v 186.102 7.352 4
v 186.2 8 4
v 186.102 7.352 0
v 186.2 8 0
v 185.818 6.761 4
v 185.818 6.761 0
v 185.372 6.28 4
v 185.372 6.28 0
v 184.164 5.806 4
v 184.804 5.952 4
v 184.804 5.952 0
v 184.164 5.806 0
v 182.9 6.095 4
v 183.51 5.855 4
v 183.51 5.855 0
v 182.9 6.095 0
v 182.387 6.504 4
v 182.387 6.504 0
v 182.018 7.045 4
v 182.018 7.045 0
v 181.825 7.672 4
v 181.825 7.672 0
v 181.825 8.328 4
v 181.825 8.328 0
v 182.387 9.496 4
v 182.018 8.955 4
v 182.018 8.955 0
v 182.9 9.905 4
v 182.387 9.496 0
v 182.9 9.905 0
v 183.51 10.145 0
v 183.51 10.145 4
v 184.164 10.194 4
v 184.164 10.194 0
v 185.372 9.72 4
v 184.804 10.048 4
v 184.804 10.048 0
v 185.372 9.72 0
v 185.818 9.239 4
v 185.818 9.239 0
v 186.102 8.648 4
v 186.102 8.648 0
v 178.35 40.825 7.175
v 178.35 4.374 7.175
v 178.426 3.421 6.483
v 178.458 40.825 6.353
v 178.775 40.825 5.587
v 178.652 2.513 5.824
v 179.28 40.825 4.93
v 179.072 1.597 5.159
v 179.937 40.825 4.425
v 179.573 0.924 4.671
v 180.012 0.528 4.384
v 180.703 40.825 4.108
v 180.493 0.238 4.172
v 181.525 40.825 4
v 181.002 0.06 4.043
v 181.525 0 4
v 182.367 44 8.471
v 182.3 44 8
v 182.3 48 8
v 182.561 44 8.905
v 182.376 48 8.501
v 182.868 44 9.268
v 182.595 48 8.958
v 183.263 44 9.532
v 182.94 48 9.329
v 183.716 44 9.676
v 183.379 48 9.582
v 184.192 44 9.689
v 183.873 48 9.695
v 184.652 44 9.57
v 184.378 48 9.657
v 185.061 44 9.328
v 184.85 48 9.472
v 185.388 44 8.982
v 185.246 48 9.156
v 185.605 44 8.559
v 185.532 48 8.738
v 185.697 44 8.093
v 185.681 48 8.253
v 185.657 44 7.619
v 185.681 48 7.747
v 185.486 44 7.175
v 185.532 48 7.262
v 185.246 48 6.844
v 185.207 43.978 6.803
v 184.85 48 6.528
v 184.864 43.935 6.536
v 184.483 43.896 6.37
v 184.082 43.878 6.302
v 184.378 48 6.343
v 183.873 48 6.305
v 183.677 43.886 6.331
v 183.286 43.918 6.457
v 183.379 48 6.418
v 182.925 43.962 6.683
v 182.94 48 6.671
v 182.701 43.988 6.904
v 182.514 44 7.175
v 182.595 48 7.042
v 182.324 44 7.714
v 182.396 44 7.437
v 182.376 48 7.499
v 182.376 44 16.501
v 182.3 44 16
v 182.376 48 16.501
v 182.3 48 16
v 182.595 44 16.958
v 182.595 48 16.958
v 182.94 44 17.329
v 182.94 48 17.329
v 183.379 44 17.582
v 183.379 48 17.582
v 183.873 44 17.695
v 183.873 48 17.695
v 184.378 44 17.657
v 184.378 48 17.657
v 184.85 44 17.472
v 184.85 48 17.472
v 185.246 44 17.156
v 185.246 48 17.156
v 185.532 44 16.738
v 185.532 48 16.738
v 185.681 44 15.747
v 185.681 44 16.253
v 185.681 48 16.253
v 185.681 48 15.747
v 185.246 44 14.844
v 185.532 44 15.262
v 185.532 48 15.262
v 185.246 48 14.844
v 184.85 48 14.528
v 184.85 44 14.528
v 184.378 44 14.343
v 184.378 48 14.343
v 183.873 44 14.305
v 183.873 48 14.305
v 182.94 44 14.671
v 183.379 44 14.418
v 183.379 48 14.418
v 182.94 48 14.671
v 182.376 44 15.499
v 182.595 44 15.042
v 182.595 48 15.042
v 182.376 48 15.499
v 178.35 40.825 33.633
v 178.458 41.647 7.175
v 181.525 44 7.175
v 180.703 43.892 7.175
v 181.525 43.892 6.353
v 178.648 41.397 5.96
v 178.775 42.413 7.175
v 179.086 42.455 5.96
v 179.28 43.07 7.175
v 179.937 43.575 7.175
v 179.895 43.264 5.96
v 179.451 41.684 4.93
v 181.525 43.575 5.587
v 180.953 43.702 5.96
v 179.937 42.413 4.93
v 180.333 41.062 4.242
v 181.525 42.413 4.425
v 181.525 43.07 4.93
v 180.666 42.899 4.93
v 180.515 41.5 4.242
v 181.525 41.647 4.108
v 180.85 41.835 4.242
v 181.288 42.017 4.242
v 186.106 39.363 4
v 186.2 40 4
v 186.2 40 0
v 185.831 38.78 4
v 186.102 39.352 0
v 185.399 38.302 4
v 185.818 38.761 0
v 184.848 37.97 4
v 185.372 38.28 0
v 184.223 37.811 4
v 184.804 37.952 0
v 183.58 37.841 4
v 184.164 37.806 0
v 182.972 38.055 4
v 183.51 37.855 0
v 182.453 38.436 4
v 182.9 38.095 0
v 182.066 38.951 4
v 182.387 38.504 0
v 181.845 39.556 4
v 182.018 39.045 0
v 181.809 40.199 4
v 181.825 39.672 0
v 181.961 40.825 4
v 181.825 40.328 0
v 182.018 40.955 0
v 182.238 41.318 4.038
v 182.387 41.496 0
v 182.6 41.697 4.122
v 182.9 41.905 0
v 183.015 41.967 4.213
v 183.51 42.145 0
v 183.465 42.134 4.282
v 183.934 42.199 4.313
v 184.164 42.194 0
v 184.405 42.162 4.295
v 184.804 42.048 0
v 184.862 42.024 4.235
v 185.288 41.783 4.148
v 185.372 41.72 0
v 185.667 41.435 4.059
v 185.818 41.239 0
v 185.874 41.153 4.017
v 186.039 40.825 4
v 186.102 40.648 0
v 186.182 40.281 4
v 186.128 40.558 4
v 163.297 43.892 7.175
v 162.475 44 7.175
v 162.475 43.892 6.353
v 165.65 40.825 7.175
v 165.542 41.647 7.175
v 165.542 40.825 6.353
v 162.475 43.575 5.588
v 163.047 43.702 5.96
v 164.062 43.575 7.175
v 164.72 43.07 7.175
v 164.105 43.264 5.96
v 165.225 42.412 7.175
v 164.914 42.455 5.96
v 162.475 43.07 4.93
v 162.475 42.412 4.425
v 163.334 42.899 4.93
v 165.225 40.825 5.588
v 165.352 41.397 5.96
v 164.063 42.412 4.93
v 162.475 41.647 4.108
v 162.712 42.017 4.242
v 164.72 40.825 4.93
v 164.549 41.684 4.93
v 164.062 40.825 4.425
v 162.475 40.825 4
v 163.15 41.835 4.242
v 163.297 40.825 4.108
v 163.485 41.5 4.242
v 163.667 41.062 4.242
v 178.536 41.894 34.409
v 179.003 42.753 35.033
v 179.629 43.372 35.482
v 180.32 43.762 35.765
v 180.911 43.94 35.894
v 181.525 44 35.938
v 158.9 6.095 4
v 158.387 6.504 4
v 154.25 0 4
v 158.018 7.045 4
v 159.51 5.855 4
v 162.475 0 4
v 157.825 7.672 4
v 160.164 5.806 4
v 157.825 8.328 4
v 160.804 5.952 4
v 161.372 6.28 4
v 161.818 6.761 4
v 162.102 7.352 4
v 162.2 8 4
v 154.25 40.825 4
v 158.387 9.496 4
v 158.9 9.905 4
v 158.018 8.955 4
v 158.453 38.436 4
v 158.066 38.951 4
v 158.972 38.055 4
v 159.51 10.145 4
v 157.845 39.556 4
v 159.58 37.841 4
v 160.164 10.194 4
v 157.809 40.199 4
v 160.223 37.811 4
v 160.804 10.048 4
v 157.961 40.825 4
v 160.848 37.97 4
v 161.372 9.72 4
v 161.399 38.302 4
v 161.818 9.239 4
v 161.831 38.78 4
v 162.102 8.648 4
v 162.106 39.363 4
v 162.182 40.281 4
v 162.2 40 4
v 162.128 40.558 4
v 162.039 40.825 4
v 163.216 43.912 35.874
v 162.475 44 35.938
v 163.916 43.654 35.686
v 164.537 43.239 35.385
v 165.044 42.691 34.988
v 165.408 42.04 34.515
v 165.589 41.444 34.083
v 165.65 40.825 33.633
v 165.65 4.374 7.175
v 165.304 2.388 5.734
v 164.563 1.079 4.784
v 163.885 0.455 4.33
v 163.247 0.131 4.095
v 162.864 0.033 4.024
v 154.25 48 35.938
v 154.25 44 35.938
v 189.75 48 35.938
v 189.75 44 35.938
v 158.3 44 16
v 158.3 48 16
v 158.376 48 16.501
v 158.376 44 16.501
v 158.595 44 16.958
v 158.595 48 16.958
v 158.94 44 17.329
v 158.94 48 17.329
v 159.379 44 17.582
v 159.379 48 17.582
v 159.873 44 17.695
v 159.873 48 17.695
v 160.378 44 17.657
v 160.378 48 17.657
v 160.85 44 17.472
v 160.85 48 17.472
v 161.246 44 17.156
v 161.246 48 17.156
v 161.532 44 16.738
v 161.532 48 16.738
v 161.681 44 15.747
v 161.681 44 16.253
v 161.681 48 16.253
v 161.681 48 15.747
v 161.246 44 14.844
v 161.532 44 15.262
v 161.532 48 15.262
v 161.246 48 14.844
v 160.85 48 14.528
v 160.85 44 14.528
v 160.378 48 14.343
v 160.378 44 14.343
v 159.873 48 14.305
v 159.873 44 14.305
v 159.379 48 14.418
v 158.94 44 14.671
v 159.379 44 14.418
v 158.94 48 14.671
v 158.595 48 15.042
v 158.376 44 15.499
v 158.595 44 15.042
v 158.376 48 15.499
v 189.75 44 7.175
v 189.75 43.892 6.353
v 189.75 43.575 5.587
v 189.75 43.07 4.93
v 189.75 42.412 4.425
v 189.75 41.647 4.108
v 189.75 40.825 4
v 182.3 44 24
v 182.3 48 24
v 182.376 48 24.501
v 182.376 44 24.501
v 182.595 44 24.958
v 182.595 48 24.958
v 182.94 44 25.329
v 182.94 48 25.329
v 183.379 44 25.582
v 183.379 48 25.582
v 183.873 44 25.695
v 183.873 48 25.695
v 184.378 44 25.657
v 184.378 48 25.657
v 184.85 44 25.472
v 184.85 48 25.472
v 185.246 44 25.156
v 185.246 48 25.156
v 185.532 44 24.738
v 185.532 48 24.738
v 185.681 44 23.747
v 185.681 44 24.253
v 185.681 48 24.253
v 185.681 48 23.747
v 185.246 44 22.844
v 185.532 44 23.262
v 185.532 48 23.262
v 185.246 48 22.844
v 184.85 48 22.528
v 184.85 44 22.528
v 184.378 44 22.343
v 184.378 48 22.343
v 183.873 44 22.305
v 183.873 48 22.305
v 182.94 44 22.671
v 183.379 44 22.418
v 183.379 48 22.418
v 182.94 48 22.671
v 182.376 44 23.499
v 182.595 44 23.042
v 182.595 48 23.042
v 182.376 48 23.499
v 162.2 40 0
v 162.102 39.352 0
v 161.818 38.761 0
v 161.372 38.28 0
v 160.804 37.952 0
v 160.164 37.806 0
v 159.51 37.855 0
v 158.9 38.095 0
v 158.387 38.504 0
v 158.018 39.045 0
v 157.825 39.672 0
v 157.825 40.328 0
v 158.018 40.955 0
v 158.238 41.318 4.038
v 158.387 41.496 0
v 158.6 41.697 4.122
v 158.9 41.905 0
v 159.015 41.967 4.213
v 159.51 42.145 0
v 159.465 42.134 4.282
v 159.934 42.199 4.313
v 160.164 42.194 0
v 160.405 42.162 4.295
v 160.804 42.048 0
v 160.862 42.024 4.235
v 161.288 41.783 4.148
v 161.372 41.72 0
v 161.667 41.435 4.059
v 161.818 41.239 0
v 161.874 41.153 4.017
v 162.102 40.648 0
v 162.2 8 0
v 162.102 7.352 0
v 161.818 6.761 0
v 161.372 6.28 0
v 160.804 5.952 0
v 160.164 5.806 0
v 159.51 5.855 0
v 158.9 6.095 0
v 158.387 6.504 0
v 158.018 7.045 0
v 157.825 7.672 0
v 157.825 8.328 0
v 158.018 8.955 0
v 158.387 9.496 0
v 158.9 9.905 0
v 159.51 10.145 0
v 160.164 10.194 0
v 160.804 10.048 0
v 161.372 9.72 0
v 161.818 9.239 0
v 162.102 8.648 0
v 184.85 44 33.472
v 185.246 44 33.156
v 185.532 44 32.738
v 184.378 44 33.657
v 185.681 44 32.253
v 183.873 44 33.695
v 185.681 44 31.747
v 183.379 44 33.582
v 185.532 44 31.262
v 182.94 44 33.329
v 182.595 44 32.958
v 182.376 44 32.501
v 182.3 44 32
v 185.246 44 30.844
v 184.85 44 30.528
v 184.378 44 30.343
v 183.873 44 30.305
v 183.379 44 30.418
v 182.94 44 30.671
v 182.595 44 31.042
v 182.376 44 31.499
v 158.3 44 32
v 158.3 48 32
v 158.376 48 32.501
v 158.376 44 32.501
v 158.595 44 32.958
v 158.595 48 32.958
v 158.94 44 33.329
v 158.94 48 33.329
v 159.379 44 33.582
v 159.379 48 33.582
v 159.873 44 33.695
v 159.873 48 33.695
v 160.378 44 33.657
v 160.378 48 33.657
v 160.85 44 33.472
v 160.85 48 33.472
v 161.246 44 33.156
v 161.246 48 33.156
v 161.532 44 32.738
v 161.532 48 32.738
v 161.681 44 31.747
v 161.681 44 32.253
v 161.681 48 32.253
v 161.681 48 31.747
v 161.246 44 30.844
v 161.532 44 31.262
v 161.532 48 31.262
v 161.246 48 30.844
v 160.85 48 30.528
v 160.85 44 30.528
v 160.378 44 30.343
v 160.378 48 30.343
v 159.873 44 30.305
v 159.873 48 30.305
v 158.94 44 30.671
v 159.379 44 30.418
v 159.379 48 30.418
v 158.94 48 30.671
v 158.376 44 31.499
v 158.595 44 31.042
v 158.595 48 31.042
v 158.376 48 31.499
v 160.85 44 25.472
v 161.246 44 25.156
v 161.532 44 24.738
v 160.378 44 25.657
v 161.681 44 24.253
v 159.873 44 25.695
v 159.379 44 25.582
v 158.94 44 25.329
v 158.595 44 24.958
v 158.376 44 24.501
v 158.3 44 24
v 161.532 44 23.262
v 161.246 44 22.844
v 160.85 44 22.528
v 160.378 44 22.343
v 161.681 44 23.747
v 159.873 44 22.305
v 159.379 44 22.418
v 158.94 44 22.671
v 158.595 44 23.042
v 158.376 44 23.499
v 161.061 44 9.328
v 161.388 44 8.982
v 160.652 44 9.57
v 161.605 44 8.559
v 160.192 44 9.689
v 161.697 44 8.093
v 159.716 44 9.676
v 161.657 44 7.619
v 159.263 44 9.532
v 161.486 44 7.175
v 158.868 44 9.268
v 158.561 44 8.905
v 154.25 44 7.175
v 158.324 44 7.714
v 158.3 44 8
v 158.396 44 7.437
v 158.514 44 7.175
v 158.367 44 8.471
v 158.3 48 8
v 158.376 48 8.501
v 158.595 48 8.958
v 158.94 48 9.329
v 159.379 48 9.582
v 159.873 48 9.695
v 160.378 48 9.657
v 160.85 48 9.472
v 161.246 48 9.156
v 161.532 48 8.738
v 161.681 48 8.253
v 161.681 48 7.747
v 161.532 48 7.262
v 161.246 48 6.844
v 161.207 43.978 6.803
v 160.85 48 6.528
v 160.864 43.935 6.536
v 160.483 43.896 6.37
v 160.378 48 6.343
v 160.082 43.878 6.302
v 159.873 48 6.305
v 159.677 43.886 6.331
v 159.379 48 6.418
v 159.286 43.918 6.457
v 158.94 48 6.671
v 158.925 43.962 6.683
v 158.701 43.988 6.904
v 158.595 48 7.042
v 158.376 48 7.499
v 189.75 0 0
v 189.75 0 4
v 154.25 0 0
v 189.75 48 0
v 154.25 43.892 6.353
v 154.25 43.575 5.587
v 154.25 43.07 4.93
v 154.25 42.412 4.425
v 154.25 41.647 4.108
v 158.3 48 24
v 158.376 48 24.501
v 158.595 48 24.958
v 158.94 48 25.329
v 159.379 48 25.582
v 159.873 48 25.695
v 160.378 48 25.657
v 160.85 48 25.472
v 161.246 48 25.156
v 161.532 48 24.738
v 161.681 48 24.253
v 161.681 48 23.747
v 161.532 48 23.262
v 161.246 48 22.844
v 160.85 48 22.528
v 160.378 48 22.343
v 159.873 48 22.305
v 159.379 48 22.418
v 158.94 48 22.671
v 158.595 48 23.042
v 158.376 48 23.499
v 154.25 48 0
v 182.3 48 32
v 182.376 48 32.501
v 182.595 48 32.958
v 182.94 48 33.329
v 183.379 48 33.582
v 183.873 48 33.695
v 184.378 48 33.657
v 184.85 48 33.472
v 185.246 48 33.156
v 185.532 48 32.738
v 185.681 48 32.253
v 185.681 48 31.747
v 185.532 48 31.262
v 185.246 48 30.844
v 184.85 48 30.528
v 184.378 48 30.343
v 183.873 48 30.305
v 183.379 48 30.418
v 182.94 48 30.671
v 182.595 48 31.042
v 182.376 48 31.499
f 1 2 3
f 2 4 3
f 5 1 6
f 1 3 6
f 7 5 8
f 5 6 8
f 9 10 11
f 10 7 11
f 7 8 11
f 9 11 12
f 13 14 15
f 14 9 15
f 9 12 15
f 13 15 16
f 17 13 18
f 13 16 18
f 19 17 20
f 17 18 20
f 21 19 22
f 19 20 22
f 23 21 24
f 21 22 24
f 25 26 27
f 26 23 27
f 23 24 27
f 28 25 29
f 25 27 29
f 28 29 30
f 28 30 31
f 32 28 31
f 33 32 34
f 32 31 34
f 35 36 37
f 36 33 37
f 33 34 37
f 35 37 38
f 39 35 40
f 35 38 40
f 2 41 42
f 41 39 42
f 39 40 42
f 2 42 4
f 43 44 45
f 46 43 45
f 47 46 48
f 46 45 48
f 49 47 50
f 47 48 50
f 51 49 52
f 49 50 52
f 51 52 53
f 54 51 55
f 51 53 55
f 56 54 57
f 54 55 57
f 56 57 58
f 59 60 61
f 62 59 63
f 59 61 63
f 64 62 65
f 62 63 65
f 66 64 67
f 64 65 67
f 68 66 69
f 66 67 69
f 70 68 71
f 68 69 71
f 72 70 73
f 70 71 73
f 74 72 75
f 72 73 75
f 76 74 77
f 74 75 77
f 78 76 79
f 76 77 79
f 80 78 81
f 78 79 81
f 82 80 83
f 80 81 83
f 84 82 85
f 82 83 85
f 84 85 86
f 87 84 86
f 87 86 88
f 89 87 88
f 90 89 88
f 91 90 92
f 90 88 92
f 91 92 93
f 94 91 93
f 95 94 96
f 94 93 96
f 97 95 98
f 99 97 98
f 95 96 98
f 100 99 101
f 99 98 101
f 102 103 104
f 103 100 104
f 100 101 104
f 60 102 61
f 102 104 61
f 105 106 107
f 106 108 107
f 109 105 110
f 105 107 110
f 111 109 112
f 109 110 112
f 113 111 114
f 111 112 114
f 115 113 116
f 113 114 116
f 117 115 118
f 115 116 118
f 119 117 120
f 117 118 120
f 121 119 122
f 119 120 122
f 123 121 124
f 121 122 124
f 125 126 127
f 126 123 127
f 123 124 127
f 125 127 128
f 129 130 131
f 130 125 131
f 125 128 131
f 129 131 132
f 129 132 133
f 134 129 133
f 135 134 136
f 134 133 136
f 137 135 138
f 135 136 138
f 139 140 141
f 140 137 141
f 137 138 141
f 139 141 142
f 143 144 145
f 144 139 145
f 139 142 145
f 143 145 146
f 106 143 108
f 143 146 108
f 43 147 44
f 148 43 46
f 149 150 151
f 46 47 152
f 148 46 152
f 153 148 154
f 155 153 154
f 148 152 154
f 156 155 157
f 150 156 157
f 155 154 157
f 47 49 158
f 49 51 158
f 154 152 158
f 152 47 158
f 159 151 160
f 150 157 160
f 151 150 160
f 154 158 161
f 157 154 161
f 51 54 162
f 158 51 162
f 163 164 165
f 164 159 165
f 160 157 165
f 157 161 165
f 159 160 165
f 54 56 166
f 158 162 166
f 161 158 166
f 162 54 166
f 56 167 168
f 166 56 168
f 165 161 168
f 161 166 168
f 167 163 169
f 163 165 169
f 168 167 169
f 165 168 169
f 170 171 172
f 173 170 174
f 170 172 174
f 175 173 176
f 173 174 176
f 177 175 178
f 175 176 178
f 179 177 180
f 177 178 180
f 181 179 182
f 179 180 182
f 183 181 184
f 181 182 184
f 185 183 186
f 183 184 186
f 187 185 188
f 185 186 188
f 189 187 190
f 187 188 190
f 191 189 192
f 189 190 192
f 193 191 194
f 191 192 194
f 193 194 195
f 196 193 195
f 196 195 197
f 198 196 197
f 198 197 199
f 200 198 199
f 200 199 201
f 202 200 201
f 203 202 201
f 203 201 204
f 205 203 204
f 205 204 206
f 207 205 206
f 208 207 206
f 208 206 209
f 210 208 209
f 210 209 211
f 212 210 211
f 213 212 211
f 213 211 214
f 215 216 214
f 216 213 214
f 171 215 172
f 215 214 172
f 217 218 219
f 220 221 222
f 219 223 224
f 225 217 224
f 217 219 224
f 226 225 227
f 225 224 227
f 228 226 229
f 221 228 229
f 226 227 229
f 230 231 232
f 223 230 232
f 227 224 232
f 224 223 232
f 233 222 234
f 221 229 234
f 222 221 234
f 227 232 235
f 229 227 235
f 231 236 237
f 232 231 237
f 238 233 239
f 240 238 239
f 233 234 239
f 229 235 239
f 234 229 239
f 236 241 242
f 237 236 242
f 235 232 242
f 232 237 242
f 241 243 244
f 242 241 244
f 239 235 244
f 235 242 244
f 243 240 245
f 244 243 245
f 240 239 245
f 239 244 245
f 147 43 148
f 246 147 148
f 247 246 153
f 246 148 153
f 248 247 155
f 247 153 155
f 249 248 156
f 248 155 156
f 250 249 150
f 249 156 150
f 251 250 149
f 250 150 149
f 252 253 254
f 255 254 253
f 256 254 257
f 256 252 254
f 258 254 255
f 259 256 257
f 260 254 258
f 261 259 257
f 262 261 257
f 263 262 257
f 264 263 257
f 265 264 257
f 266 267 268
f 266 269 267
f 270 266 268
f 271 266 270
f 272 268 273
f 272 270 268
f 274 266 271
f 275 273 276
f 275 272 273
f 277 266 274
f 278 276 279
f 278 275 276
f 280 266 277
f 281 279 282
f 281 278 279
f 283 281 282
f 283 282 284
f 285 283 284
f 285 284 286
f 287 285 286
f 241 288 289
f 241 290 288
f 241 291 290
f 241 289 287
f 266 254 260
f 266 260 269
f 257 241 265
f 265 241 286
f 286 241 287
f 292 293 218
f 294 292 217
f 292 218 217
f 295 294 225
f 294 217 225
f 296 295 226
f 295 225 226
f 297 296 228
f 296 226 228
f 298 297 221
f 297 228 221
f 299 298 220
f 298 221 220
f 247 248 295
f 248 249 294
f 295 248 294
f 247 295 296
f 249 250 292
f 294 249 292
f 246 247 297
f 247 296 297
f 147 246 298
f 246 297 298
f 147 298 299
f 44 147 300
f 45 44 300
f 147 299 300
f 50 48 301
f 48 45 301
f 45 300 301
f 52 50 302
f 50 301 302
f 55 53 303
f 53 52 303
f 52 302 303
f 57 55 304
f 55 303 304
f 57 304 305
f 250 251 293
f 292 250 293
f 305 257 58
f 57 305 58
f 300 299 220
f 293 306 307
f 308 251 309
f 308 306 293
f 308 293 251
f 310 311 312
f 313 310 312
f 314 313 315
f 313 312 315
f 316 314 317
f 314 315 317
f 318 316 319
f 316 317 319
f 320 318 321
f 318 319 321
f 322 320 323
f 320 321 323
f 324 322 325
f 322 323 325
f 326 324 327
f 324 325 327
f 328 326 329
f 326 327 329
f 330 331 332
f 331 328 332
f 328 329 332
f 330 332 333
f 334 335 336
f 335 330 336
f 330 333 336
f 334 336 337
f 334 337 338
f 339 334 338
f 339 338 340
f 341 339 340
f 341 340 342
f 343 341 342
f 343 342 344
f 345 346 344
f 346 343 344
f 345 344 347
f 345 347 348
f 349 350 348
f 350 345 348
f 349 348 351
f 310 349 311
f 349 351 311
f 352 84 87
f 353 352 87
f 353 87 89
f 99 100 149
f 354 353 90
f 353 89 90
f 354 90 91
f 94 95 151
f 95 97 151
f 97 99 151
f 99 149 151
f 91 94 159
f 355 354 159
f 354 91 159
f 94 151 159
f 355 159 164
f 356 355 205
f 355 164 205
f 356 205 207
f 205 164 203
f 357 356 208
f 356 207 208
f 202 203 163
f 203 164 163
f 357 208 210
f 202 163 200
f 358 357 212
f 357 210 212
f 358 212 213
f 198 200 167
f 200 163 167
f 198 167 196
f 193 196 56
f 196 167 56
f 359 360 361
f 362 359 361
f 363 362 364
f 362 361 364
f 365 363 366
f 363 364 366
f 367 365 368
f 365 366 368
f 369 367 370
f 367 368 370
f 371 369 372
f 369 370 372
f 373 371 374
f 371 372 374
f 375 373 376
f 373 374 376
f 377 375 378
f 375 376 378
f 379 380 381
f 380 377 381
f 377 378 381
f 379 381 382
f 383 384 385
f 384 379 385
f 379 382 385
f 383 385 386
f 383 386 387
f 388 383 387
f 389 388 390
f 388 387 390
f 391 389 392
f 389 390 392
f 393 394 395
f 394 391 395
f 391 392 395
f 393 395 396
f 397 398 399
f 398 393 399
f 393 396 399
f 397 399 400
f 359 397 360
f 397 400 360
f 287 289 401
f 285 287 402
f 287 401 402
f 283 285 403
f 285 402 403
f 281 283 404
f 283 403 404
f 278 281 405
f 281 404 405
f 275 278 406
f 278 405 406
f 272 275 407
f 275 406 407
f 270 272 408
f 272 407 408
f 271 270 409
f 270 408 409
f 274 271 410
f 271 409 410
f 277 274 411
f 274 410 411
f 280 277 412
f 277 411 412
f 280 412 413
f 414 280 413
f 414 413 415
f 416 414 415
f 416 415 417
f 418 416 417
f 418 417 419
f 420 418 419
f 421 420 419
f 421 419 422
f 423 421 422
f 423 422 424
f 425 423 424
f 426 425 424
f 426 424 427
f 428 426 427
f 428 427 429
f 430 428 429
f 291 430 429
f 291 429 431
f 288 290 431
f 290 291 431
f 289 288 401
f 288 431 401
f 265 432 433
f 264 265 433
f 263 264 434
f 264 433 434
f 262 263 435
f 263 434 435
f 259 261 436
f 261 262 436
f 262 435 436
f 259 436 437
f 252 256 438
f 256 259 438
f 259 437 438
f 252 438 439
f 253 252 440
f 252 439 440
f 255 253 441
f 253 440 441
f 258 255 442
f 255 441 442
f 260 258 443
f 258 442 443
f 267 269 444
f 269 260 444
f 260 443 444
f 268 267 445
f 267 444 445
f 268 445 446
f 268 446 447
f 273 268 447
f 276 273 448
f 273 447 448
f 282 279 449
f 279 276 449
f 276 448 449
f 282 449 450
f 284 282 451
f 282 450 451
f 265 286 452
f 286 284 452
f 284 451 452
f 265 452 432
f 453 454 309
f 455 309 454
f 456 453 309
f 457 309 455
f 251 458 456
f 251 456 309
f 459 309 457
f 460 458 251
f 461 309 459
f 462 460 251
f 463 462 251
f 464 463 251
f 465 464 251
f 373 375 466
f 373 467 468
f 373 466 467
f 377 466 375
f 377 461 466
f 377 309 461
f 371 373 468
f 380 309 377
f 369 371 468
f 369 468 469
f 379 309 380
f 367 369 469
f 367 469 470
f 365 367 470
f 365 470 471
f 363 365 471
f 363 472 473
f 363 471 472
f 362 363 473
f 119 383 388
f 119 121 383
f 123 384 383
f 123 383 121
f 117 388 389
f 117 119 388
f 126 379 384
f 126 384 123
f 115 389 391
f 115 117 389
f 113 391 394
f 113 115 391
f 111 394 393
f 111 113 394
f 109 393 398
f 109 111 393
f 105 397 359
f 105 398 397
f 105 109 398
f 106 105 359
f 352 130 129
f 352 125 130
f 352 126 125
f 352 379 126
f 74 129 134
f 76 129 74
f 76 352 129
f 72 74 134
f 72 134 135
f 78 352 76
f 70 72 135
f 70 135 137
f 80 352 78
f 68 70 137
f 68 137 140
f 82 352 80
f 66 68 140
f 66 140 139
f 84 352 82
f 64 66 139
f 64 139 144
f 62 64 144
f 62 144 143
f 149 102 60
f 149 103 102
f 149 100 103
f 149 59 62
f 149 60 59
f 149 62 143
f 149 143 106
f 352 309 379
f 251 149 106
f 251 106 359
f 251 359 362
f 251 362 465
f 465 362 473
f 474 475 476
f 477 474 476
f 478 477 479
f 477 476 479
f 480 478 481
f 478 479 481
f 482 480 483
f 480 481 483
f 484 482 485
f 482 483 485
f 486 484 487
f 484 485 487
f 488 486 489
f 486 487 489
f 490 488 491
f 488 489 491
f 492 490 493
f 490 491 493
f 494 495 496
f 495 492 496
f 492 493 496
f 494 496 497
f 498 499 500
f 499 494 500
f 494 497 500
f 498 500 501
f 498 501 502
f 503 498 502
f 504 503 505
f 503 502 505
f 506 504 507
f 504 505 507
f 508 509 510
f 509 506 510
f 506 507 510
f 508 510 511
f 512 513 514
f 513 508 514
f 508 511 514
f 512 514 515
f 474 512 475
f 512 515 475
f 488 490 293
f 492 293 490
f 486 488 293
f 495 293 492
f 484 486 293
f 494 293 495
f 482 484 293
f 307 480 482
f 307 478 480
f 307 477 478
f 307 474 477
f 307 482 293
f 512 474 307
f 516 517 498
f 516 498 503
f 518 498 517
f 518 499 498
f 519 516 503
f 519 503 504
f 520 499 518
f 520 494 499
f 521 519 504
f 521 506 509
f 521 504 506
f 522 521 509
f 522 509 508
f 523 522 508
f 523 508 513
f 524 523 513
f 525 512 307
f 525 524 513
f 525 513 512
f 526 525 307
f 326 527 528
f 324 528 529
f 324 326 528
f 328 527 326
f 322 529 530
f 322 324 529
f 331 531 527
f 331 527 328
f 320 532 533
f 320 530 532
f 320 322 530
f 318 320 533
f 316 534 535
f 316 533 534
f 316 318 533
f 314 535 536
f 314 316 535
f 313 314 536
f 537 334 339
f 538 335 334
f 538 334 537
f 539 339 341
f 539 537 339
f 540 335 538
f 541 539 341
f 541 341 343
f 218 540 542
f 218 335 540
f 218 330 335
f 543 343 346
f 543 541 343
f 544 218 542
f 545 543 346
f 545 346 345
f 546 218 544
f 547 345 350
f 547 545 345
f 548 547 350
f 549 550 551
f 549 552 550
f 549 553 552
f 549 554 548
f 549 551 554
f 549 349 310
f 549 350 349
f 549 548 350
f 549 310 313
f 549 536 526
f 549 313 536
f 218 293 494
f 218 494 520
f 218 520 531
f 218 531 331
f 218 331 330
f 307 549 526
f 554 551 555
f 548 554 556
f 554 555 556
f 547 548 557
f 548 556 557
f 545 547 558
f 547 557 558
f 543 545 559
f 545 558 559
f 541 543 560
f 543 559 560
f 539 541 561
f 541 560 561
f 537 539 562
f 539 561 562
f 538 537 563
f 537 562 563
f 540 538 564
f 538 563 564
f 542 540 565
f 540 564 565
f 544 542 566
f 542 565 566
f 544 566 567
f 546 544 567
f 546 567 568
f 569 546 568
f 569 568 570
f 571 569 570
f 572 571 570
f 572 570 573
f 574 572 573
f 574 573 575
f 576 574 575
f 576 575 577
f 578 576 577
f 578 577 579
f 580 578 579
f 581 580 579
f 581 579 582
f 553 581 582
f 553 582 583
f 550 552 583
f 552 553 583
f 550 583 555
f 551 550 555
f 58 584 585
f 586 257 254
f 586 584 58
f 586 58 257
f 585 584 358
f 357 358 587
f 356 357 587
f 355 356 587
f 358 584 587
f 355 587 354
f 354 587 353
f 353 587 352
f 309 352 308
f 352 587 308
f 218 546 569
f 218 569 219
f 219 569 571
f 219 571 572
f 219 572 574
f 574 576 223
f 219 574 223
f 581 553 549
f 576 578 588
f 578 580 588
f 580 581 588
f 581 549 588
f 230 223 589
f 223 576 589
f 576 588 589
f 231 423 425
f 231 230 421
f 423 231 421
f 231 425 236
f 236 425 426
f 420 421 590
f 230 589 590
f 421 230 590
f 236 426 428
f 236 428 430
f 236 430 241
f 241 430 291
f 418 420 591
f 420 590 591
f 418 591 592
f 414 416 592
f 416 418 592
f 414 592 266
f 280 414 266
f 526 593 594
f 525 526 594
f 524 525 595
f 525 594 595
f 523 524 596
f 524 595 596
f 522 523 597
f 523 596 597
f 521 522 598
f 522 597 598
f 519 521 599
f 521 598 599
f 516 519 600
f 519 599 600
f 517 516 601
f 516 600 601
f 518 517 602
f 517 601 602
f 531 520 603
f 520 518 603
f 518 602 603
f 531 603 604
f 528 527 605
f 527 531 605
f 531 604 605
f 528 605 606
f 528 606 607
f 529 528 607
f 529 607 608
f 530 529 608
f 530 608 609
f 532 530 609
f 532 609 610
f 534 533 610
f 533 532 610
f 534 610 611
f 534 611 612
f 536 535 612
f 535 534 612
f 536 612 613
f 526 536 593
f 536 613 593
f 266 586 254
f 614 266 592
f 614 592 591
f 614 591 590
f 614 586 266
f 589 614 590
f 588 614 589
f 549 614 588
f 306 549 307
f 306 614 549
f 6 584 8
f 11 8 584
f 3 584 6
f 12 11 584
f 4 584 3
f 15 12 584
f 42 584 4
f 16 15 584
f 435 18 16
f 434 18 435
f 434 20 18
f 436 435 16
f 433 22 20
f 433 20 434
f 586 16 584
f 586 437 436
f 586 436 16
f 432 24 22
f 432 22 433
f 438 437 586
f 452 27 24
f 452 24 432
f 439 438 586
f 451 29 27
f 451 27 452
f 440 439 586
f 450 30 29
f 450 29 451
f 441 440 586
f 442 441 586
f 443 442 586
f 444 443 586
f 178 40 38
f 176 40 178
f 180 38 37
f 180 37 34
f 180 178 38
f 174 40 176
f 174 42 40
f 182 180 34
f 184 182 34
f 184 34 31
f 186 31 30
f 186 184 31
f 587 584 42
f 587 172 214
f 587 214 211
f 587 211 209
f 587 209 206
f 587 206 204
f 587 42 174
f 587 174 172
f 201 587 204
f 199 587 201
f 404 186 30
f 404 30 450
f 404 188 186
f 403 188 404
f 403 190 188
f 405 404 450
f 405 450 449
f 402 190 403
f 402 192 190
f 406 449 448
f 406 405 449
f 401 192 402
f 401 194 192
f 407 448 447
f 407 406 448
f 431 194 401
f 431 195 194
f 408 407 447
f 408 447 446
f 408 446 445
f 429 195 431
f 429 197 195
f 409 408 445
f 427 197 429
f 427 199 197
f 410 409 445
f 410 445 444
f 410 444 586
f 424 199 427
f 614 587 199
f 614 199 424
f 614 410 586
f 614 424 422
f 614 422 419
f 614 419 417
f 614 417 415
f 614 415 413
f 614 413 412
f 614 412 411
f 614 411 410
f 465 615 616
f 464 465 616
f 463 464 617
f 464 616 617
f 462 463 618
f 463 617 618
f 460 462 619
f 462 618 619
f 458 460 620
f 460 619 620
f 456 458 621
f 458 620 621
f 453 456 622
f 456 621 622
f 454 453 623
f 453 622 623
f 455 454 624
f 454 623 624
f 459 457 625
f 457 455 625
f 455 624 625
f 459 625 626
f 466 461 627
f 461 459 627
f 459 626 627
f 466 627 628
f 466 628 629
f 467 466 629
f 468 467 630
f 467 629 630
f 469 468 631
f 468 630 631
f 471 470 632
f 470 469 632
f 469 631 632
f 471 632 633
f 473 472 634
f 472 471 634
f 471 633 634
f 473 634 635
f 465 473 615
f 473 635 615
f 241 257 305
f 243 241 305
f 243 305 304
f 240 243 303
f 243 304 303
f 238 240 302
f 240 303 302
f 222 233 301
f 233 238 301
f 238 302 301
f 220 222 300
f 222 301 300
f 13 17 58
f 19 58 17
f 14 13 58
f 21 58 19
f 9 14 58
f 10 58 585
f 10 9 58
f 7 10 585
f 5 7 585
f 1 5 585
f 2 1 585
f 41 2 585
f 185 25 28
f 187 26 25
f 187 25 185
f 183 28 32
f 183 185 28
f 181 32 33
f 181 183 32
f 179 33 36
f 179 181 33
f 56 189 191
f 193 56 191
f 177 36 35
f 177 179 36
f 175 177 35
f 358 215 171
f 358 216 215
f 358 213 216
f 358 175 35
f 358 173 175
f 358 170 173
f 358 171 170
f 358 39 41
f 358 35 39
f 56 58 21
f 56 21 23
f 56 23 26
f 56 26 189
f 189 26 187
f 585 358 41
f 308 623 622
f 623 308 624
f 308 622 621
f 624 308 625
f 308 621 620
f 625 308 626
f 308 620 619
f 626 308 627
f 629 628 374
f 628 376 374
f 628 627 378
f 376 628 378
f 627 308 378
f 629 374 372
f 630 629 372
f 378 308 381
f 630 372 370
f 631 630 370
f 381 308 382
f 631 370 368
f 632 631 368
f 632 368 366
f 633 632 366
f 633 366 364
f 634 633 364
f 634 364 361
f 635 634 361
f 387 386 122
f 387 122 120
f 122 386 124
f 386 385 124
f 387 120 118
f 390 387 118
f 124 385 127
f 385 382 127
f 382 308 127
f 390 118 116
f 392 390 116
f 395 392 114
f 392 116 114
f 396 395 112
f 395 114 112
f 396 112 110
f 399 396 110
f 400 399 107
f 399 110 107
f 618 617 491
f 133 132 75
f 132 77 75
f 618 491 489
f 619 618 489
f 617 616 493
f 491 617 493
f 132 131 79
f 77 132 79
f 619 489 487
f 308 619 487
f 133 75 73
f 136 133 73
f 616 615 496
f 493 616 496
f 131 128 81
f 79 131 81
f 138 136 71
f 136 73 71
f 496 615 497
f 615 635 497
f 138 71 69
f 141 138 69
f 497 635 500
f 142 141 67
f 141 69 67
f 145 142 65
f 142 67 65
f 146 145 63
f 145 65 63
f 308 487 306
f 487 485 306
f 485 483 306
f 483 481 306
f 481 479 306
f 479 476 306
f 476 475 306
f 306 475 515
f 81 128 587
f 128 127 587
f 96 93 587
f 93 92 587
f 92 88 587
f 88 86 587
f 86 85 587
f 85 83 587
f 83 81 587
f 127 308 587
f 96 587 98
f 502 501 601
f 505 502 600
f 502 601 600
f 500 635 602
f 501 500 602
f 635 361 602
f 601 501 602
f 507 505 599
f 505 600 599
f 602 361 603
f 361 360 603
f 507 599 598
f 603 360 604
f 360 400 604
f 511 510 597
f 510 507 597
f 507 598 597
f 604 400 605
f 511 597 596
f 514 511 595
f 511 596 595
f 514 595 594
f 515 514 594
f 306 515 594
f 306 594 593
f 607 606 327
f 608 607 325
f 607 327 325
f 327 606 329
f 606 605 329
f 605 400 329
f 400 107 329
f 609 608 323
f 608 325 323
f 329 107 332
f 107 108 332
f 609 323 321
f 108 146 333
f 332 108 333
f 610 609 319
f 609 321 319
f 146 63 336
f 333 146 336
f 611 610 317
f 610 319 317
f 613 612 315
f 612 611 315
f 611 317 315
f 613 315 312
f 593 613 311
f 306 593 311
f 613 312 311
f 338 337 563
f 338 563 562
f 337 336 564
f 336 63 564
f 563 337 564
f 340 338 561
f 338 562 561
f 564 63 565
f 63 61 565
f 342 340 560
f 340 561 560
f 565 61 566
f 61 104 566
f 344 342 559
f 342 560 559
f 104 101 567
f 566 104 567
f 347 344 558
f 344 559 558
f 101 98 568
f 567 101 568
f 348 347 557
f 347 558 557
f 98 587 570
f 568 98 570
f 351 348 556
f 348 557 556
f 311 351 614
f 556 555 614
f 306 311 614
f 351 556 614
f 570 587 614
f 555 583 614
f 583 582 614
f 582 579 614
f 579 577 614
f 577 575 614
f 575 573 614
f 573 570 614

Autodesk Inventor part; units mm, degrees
ref_plane "Work Plane1" through (172, 48, 15.3) normal (0, -1, 0) x (-1, 0, 0)
sketch "Sketch1" plane through (172, 48, 15.3) normal (0, -1, 0) x (-1, 0, 0)
  circle A0 centre (12, -16.7) radius 1.7 construction
  circle A1 centre (12, -32.7) radius 1.7 construction
  circle A2 centre (-12, 7.3) radius 1.7 construction
  circle A3 centre (-12, 15.3) radius 1.7 construction
  circle A4 centre (-12, 23.3) radius 1.7 construction
  circle A5 centre (-12, -24.7) radius 1.7 construction
  circle A6 centre (12, 23.3) radius 1.7 construction
  circle A7 centre (12, -56.7) radius 1.7 construction
  circle A8 centre (12, -48.7) radius 1.7 construction
  circle A9 centre (12, -40.7) radius 1.7 construction
  circle A10 centre (12, -8.7) radius 1.7 construction
  circle A11 centre (-12, -16.7) radius 1.7 construction
  circle A12 centre (12, -24.7) radius 1.7 construction
  circle A13 centre (-12, -0.7) radius 1.7 construction
  circle A14 centre (-12, -40.7) radius 1.7 construction
  circle A15 centre (-12, -48.7) radius 1.7 construction
  circle A16 centre (-12, -56.7) radius 1.7 construction
  circle A17 centre (-12, -32.7) radius 1.7 construction
  circle A18 centre (12, -80.7) radius 1.7 construction
  circle A19 centre (12, 15.3) radius 1.7 construction
  circle A20 centre (12, 7.3) radius 1.7 construction
  circle A21 centre (12, -0.7) radius 1.7 construction
  circle A22 centre (-12, -8.7) radius 1.7 construction
  circle A23 centre (-12, -80.7) radius 1.7 construction
  line L0 (10.05, 51.5627) -> (14.45, 51.5627) construction
  line L1 (14.45, 51.5627) -> (14.45, 45.5871) construction
  line L2 (14.45, 45.5871) -> (10.05, 45.5871) construction
  line L3 (10.05, 45.5871) -> (10.05, 51.5627) construction
  line L4 (10.05, -66.0122) -> (14.45, -66.0122) construction
  line L5 (14.45, -66.0122) -> (14.45, -71.9878) construction
  line L6 (14.45, -71.9878) -> (10.05, -71.9878) construction
  line L7 (10.05, -71.9878) -> (10.05, -66.0122) construction
  line L8 (-10.05, 75.3622) -> (-14.45, 75.3622) construction
  line L9 (-14.45, 75.3622) -> (-14.45, 81.3378) construction
  line L10 (-14.45, 81.3378) -> (-10.05, 81.3378) construction
  line L11 (-10.05, 81.3378) -> (-10.05, 75.3622) construction
  line L12 (-14.45, 56.302) -> (-10.05, 56.302) construction
  line L13 (-10.05, 56.302) -> (-10.05, 50.3264) construction
  line L14 (-10.05, 50.3264) -> (-14.45, 50.3264) construction
  line L15 (-14.45, 50.3264) -> (-14.45, 56.302) construction
  line L16 (9.5604, 33.925) -> (12.375, 35.55) construction
  line L17 (12.375, 35.55) -> (15.1896, 33.925) construction
  line L18 (15.1896, 33.925) -> (15.1896, 30.675) construction
  line L19 (15.1896, 30.675) -> (12.375, 29.05) construction
  line L20 (12.375, 29.05) -> (9.5604, 30.675) construction
  line L21 (9.5604, 30.675) -> (9.5604, 33.925) construction
  line L22 (2.8106, 33.925) -> (5.6252, 35.55) construction
  line L23 (5.6252, 35.55) -> (8.4398, 33.925) construction
  line L24 (8.4398, 33.925) -> (8.4398, 30.675) construction
  line L25 (8.4398, 30.675) -> (5.6252, 29.05) construction
  line L26 (5.6252, 29.05) -> (2.8106, 30.675) construction
  line L27 (2.8106, 30.675) -> (2.8106, 33.925) construction
  line L28 (3.2502, 68.3) -> (3.2502, 81) construction
  line L29 (3.2502, 81) -> (8.0002, 81) construction
  line L30 (8.0002, 81) -> (8.0002, 68.3) construction
  line L31 (8.0002, 68.3) -> (3.2502, 68.3) construction
  circle A24 centre (12.375, 40.3) radius 1.7 construction
  circle A25 centre (5.6252, 40.3) radius 1.7 construction
  line L32 (10.0002, 81) -> (14.75, 81) construction
  line L33 (14.75, 81) -> (14.75, 68.3) construction
  line L34 (14.75, 68.3) -> (10.0002, 68.3) construction
  line L35 (10.0002, 68.3) -> (10.0002, 81) construction
  line L36 (3.2502, 53.6) -> (3.2502, 66.3) construction
  line L37 (3.2502, 66.3) -> (8.0002, 66.3) construction
  line L38 (8.0002, 66.3) -> (8.0002, 53.6) construction
  line L39 (8.0002, 53.6) -> (3.2502, 53.6) construction
  circle A26 centre (-7.75, 60) radius 1.7 construction
  circle A27 centre (-7.75, -75) radius 1.7 construction
  line L40 (-6.125, 72.8146) -> (-4.5, 70) construction
  line L41 (-4.5, 70) -> (-6.125, 67.1854) construction
  line L42 (-6.125, 67.1854) -> (-9.375, 67.1854) construction
  line L43 (-9.375, 67.1854) -> (-11, 70) construction
  line L44 (-11, 70) -> (-9.375, 72.8146) construction
  line L45 (-9.375, 72.8146) -> (-6.125, 72.8146) construction
  line L46 (-6.125, -62.1854) -> (-4.5, -65) construction
  line L47 (-4.5, -65) -> (-6.125, -67.8146) construction
  line L48 (-6.125, -67.8146) -> (-9.375, -67.8146) construction
  line L49 (-9.375, -67.8146) -> (-11, -65) construction
  line L50 (-11, -65) -> (-9.375, -62.1854) construction
  line L51 (-9.375, -62.1854) -> (-6.125, -62.1854) construction
  line L52 (17.75, 85) -> (-17.75, 85) construction
  line L53 (-17.75, 85) -> (-17.75, -85) construction
  line L54 (-17.75, -85) -> (17.75, -85) construction
  line L55 (17.75, -85) -> (17.75, 85) construction
  line L56 (172, 15.3) -> (-20, 15.3) construction
  line L57 (-17.75, 15.3) -> (17.75, 15.3)
  line L58 (17.75, 15.3) -> (17.75, -20.6375)
  line L59 (17.75, -20.6375) -> (-17.75, -20.6375)
  line L60 (-17.75, 15.3) -> (-17.75, -20.6375)
  circle A28 centre (-12, 7.3) radius 1.7
  circle A29 centre (-12, -0.7) radius 1.7
  circle A30 centre (-12, -8.7) radius 1.7
  circle A31 centre (-12, -16.7) radius 1.7
  circle A32 centre (12, -16.7) radius 1.7
  circle A33 centre (12, -8.7) radius 1.7
  circle A34 centre (12, -0.7) radius 1.7
  circle A35 centre (12, 7.3) radius 1.7
extrude "Extrusion1" add sketch "Sketch1" along normal blind 4
ref_plane "Work Plane2" through (0, 0, 0) normal (0, 0, 1) x (1, 0, 0)
sketch "Sketch2" plane through (0, 0, 0) normal (0, 0, 1) x (1, 0, 0)
  line L0 (192, 0) -> (192, 48) construction
  line L1 (0, 48) -> (192, 48) construction
  line L2 (0, 0) -> (0, 48) construction
  line L3 (0, 0) -> (192, 0) construction
  circle A0 centre (168, 24) radius 7 construction
  circle A1 centre (144, 24) radius 7 construction
  arc A2 (160.9289, 33.8995) -> (158.1005, 31.0711) centre (159.5147, 32.4853) ccw construction
  line L4 (161.4142, 33.4142) -> (160.9289, 33.8995) construction
  arc A3 (158.5858, 30.5858) -> (161.4142, 33.4142) centre (160, 32) ccw construction
  line L5 (158.1005, 31.0711) -> (158.5858, 30.5858) construction
  line L6 (156.6863, 26) -> (155.3137, 26) construction
  arc A4 (156.6863, 22) -> (156.6863, 26) centre (156.6863, 24) ccw construction
  line L7 (155.3137, 22) -> (156.6863, 22) construction
  arc A5 (155.3137, 26) -> (155.3137, 22) centre (155.3137, 24) ccw construction
  arc A6 (158.1005, 16.9289) -> (160.9289, 14.1005) centre (159.5147, 15.5147) ccw construction
  line L8 (158.5858, 17.4142) -> (158.1005, 16.9289) construction
  arc A7 (161.4142, 14.5858) -> (158.5858, 17.4142) centre (160, 16) ccw construction
  line L9 (160.9289, 14.1005) -> (161.4142, 14.5858) construction
  arc A8 (177.8995, 31.0711) -> (175.0711, 33.8995) centre (176.4853, 32.4853) ccw construction
  line L10 (177.4142, 30.5858) -> (177.8995, 31.0711) construction
  arc A9 (174.5858, 33.4142) -> (177.4142, 30.5858) centre (176, 32) ccw construction
  line L11 (175.0711, 33.8995) -> (174.5858, 33.4142) construction
  arc A10 (180.6863, 22) -> (180.6863, 26) centre (180.6863, 24) ccw construction
  line L12 (179.3137, 22) -> (180.6863, 22) construction
  arc A11 (179.3137, 26) -> (179.3137, 22) centre (179.3137, 24) ccw construction
  line L13 (180.6863, 26) -> (179.3137, 26) construction
  line L14 (170, 35.3137) -> (170, 40) construction
  arc A12 (166, 35.3137) -> (170, 35.3137) centre (168, 35.3137) ccw construction
  line L15 (166, 40) -> (166, 35.3137) construction
  arc A13 (170, 40) -> (166, 40) centre (168, 40) ccw construction
  circle A14 centre (160, 40) radius 2 construction
  circle A15 centre (152, 40) radius 2 construction
  line L16 (146, 35.3137) -> (146, 40) construction
  arc A16 (142, 35.3137) -> (146, 35.3137) centre (144, 35.3137) ccw construction
  line L17 (142, 40) -> (142, 35.3137) construction
  arc A17 (146, 40) -> (142, 40) centre (144, 40) ccw construction
  circle A18 centre (136, 40) radius 2 construction
  circle A19 centre (128, 40) radius 2 construction
  line L18 (122, 35.3137) -> (122, 40) construction
  arc A20 (118, 35.3137) -> (122, 35.3137) centre (120, 35.3137) ccw construction
  line L19 (118, 40) -> (118, 35.3137) construction
  arc A21 (122, 40) -> (118, 40) centre (120, 40) ccw construction
  circle A22 centre (112, 40) radius 2 construction
  circle A23 centre (104, 40) radius 2 construction
  line L20 (98, 35.3137) -> (98, 40) construction
  arc A24 (94, 35.3137) -> (98, 35.3137) centre (96, 35.3137) ccw construction
  line L21 (94, 40) -> (94, 35.3137) construction
  arc A25 (98, 40) -> (94, 40) centre (96, 40) ccw construction
  circle A26 centre (88, 40) radius 2 construction
  circle A27 centre (80, 40) radius 2 construction
  line L22 (74, 35.3137) -> (74, 40) construction
  arc A28 (70, 35.3137) -> (74, 35.3137) centre (72, 35.3137) ccw construction
  line L23 (70, 40) -> (70, 35.3137) construction
  arc A29 (74, 40) -> (70, 40) centre (72, 40) ccw construction
  circle A30 centre (64, 40) radius 2 construction
  circle A31 centre (56, 40) radius 2 construction
  line L24 (50, 35.3137) -> (50, 40) construction
  arc A32 (46, 35.3137) -> (50, 35.3137) centre (48, 35.3137) ccw construction
  line L25 (46, 40) -> (46, 35.3137) construction
  arc A33 (50, 40) -> (46, 40) centre (48, 40) ccw construction
  circle A34 centre (40, 40) radius 2 construction
  circle A35 centre (32, 40) radius 2 construction
  line L26 (26, 35.3137) -> (26, 40) construction
  arc A36 (22, 35.3137) -> (26, 35.3137) centre (24, 35.3137) ccw construction
  line L27 (22, 40) -> (22, 35.3137) construction
  arc A37 (26, 40) -> (22, 40) centre (24, 40) ccw construction
  circle A38 centre (16, 40) radius 2 construction
  circle A39 centre (8, 40) radius 2 construction
  line L28 (166, 12.6863) -> (166, 8) construction
  arc A40 (170, 12.6863) -> (166, 12.6863) centre (168, 12.6863) ccw construction
  line L29 (170, 8) -> (170, 12.6863) construction
  arc A41 (166, 8) -> (170, 8) centre (168, 8) ccw construction
  circle A42 centre (160, 8) radius 2 construction
  circle A43 centre (152, 8) radius 2 construction
  line L30 (142, 12.6863) -> (142, 8) construction
  arc A44 (146, 12.6863) -> (142, 12.6863) centre (144, 12.6863) ccw construction
  line L31 (146, 8) -> (146, 12.6863) construction
  arc A45 (142, 8) -> (146, 8) centre (144, 8) ccw construction
  circle A46 centre (136, 8) radius 2 construction
  circle A47 centre (128, 8) radius 2 construction
  line L32 (118, 12.6863) -> (118, 8) construction
  arc A48 (122, 12.6863) -> (118, 12.6863) centre (120, 12.6863) ccw construction
  line L33 (122, 8) -> (122, 12.6863) construction
  arc A49 (118, 8) -> (122, 8) centre (120, 8) ccw construction
  circle A50 centre (112, 8) radius 2 construction
  circle A51 centre (104, 8) radius 2 construction
  line L34 (94, 12.6863) -> (94, 8) construction
  arc A52 (98, 12.6863) -> (94, 12.6863) centre (96, 12.6863) ccw construction
  line L35 (98, 8) -> (98, 12.6863) construction
  arc A53 (94, 8) -> (98, 8) centre (96, 8) ccw construction
  circle A54 centre (88, 8) radius 2 construction
  circle A55 centre (80, 8) radius 2 construction
  line L36 (70, 12.6863) -> (70, 8) construction
  arc A56 (74, 12.6863) -> (70, 12.6863) centre (72, 12.6863) ccw construction
  line L37 (74, 8) -> (74, 12.6863) construction
  arc A57 (70, 8) -> (74, 8) centre (72, 8) ccw construction
  circle A58 centre (64, 8) radius 2 construction
  circle A59 centre (56, 8) radius 2 construction
  line L38 (46, 12.6863) -> (46, 8) construction
  arc A60 (50, 12.6863) -> (46, 12.6863) centre (48, 12.6863) ccw construction
  line L39 (50, 8) -> (50, 12.6863) construction
  arc A61 (46, 8) -> (50, 8) centre (48, 8) ccw construction
  circle A62 centre (40, 8) radius 2 construction
  circle A63 centre (32, 8) radius 2 construction
  line L40 (22, 12.6863) -> (22, 8) construction
  arc A64 (26, 12.6863) -> (22, 12.6863) centre (24, 12.6863) ccw construction
  line L41 (26, 8) -> (26, 12.6863) construction
  arc A65 (22, 8) -> (26, 8) centre (24, 8) ccw construction
  circle A66 centre (16, 8) radius 2 construction
  circle A67 centre (8, 8) radius 2 construction
  arc A68 (9.8995, 31.0711) -> (7.0711, 33.8995) centre (8.4853, 32.4853) ccw construction
  line L42 (9.4142, 30.5858) -> (9.8995, 31.0711) construction
  arc A69 (6.5858, 33.4142) -> (9.4142, 30.5858) centre (8, 32) ccw construction
  line L43 (7.0711, 33.8995) -> (6.5858, 33.4142) construction
  arc A70 (7.0711, 14.1005) -> (9.8995, 16.9289) centre (8.4853, 15.5147) ccw construction
  line L44 (6.5858, 14.5858) -> (7.0711, 14.1005) construction
  arc A71 (9.4142, 17.4142) -> (6.5858, 14.5858) centre (8, 16) ccw construction
  line L45 (9.8995, 16.9289) -> (9.4142, 17.4142) construction
  arc A72 (184.9289, 33.8995) -> (182.1005, 31.0711) centre (183.5147, 32.4853) ccw construction
  line L46 (185.4142, 33.4142) -> (184.9289, 33.8995) construction
  arc A73 (182.5858, 30.5858) -> (185.4142, 33.4142) centre (184, 32) ccw construction
  line L47 (182.1005, 31.0711) -> (182.5858, 30.5858) construction
  arc A74 (182.1005, 16.9289) -> (184.9289, 14.1005) centre (183.5147, 15.5147) ccw construction
  line L48 (182.5858, 17.4142) -> (182.1005, 16.9289) construction
  arc A75 (185.4142, 14.5858) -> (182.5858, 17.4142) centre (184, 16) ccw construction
  line L49 (184.9289, 14.1005) -> (185.4142, 14.5858) construction
  circle A76 centre (176, 8) radius 2 construction
  circle A77 centre (176, 40) radius 2 construction
  circle A78 centre (184, 40) radius 2 construction
  circle A79 centre (184, 8) radius 2 construction
  arc A80 (33.8995, 31.0711) -> (31.0711, 33.8995) centre (32.4853, 32.4853) ccw construction
  line L50 (33.4142, 30.5858) -> (33.8995, 31.0711) construction
  arc A81 (30.5858, 33.4142) -> (33.4142, 30.5858) centre (32, 32) ccw construction
  line L51 (31.0711, 33.8995) -> (30.5858, 33.4142) construction
  arc A82 (57.8995, 31.0711) -> (55.0711, 33.8995) centre (56.4853, 32.4853) ccw construction
  line L52 (57.4142, 30.5858) -> (57.8995, 31.0711) construction
  arc A83 (54.5858, 33.4142) -> (57.4142, 30.5858) centre (56, 32) ccw construction
  line L53 (55.0711, 33.8995) -> (54.5858, 33.4142) construction
  arc A84 (81.8995, 31.0711) -> (79.0711, 33.8995) centre (80.4853, 32.4853) ccw construction
  line L54 (81.4142, 30.5858) -> (81.8995, 31.0711) construction
  arc A85 (78.5858, 33.4142) -> (81.4142, 30.5858) centre (80, 32) ccw construction
  line L55 (79.0711, 33.8995) -> (78.5858, 33.4142) construction
  arc A86 (105.8995, 31.0711) -> (103.0711, 33.8995) centre (104.4853, 32.4853) ccw construction
  line L56 (105.4142, 30.5858) -> (105.8995, 31.0711) construction
  arc A87 (102.5858, 33.4142) -> (105.4142, 30.5858) centre (104, 32) ccw construction
  line L57 (103.0711, 33.8995) -> (102.5858, 33.4142) construction
  arc A88 (129.8995, 31.0711) -> (127.0711, 33.8995) centre (128.4853, 32.4853) ccw construction
  line L58 (129.4142, 30.5858) -> (129.8995, 31.0711) construction
  arc A89 (126.5858, 33.4142) -> (129.4142, 30.5858) centre (128, 32) ccw construction
  line L59 (127.0711, 33.8995) -> (126.5858, 33.4142) construction
  arc A90 (153.8995, 31.0711) -> (151.0711, 33.8995) centre (152.4853, 32.4853) ccw construction
  line L60 (153.4142, 30.5858) -> (153.8995, 31.0711) construction
  arc A91 (150.5858, 33.4142) -> (153.4142, 30.5858) centre (152, 32) ccw construction
  line L61 (151.0711, 33.8995) -> (150.5858, 33.4142) construction
  arc A92 (14.1005, 16.9289) -> (16.9289, 14.1005) centre (15.5147, 15.5147) ccw construction
  line L62 (14.5858, 17.4142) -> (14.1005, 16.9289) construction
  arc A93 (17.4142, 14.5858) -> (14.5858, 17.4142) centre (16, 16) ccw construction
  line L63 (16.9289, 14.1005) -> (17.4142, 14.5858) construction
  arc A94 (38.1005, 16.9289) -> (40.9289, 14.1005) centre (39.5147, 15.5147) ccw construction
  line L64 (38.5858, 17.4142) -> (38.1005, 16.9289) construction
  arc A95 (41.4142, 14.5858) -> (38.5858, 17.4142) centre (40, 16) ccw construction
  line L65 (40.9289, 14.1005) -> (41.4142, 14.5858) construction
  arc A96 (62.1005, 16.9289) -> (64.9289, 14.1005) centre (63.5147, 15.5147) ccw construction
  line L66 (62.5858, 17.4142) -> (62.1005, 16.9289) construction
  arc A97 (65.4142, 14.5858) -> (62.5858, 17.4142) centre (64, 16) ccw construction
  line L67 (64.9289, 14.1005) -> (65.4142, 14.5858) construction
  arc A98 (86.1005, 16.9289) -> (88.9289, 14.1005) centre (87.5147, 15.5147) ccw construction
  line L68 (86.5858, 17.4142) -> (86.1005, 16.9289) construction
  arc A99 (89.4142, 14.5858) -> (86.5858, 17.4142) centre (88, 16) ccw construction
  line L69 (88.9289, 14.1005) -> (89.4142, 14.5858) construction
  arc A100 (110.1005, 16.9289) -> (112.9289, 14.1005) centre (111.5147, 15.5147) ccw construction
  line L70 (110.5858, 17.4142) -> (110.1005, 16.9289) construction
  arc A101 (113.4142, 14.5858) -> (110.5858, 17.4142) centre (112, 16) ccw construction
  line L71 (112.9289, 14.1005) -> (113.4142, 14.5858) construction
  arc A102 (134.1005, 16.9289) -> (136.9289, 14.1005) centre (135.5147, 15.5147) ccw construction
  line L72 (134.5858, 17.4142) -> (134.1005, 16.9289) construction
  arc A103 (137.4142, 14.5858) -> (134.5858, 17.4142) centre (136, 16) ccw construction
  line L73 (136.9289, 14.1005) -> (137.4142, 14.5858) construction
  line L74 (11.3137, 22) -> (12.6863, 22) construction
  arc A104 (11.3137, 26) -> (11.3137, 22) centre (11.3137, 24) ccw construction
  line L75 (12.6863, 26) -> (11.3137, 26) construction
  arc A105 (12.6863, 22) -> (12.6863, 26) centre (12.6863, 24) ccw construction
  line L76 (36.6863, 26) -> (35.3137, 26) construction
  arc A106 (36.6863, 22) -> (36.6863, 26) centre (36.6863, 24) ccw construction
  line L77 (35.3137, 22) -> (36.6863, 22) construction
  arc A107 (35.3137, 26) -> (35.3137, 22) centre (35.3137, 24) ccw construction
  line L78 (60.6863, 26) -> (59.3137, 26) construction
  arc A108 (60.6863, 22) -> (60.6863, 26) centre (60.6863, 24) ccw construction
  line L79 (59.3137, 22) -> (60.6863, 22) construction
  arc A109 (59.3137, 26) -> (59.3137, 22) centre (59.3137, 24) ccw construction
  line L80 (84.6863, 26) -> (83.3137, 26) construction
  arc A110 (84.6863, 22) -> (84.6863, 26) centre (84.6863, 24) ccw construction
  line L81 (83.3137, 22) -> (84.6863, 22) construction
  arc A111 (83.3137, 26) -> (83.3137, 22) centre (83.3137, 24) ccw construction
  line L82 (108.6863, 26) -> (107.3137, 26) construction
  arc A112 (108.6863, 22) -> (108.6863, 26) centre (108.6863, 24) ccw construction
  line L83 (107.3137, 22) -> (108.6863, 22) construction
  arc A113 (107.3137, 26) -> (107.3137, 22) centre (107.3137, 24) ccw construction
  line L84 (132.6863, 26) -> (131.3137, 26) construction
  arc A114 (132.6863, 22) -> (132.6863, 26) centre (132.6863, 24) ccw construction
  line L85 (131.3137, 22) -> (132.6863, 22) construction
  arc A115 (131.3137, 26) -> (131.3137, 22) centre (131.3137, 24) ccw construction
  arc A116 (16.9289, 33.8995) -> (14.1005, 31.0711) centre (15.5147, 32.4853) ccw construction
  line L86 (17.4142, 33.4142) -> (16.9289, 33.8995) construction
  arc A117 (14.5858, 30.5858) -> (17.4142, 33.4142) centre (16, 32) ccw construction
  line L87 (14.1005, 31.0711) -> (14.5858, 30.5858) construction
  arc A118 (40.9289, 33.8995) -> (38.1005, 31.0711) centre (39.5147, 32.4853) ccw construction
  line L88 (41.4142, 33.4142) -> (40.9289, 33.8995) construction
  arc A119 (38.5858, 30.5858) -> (41.4142, 33.4142) centre (40, 32) ccw construction
  line L89 (38.1005, 31.0711) -> (38.5858, 30.5858) construction
  arc A120 (64.9289, 33.8995) -> (62.1005, 31.0711) centre (63.5147, 32.4853) ccw construction
  line L90 (65.4142, 33.4142) -> (64.9289, 33.8995) construction
  arc A121 (62.5858, 30.5858) -> (65.4142, 33.4142) centre (64, 32) ccw construction
  line L91 (62.1005, 31.0711) -> (62.5858, 30.5858) construction
  arc A122 (88.9289, 33.8995) -> (86.1005, 31.0711) centre (87.5147, 32.4853) ccw construction
  line L92 (89.4142, 33.4142) -> (88.9289, 33.8995) construction
  arc A123 (86.5858, 30.5858) -> (89.4142, 33.4142) centre (88, 32) ccw construction
  line L93 (86.1005, 31.0711) -> (86.5858, 30.5858) construction
  arc A124 (112.9289, 33.8995) -> (110.1005, 31.0711) centre (111.5147, 32.4853) ccw construction
  line L94 (113.4142, 33.4142) -> (112.9289, 33.8995) construction
  arc A125 (110.5858, 30.5858) -> (113.4142, 33.4142) centre (112, 32) ccw construction
  line L95 (110.1005, 31.0711) -> (110.5858, 30.5858) construction
  arc A126 (136.9289, 33.8995) -> (134.1005, 31.0711) centre (135.5147, 32.4853) ccw construction
  line L96 (137.4142, 33.4142) -> (136.9289, 33.8995) construction
  arc A127 (134.5858, 30.5858) -> (137.4142, 33.4142) centre (136, 32) ccw construction
  line L97 (134.1005, 31.0711) -> (134.5858, 30.5858) construction
  arc A128 (31.0711, 14.1005) -> (33.8995, 16.9289) centre (32.4853, 15.5147) ccw construction
  line L98 (30.5858, 14.5858) -> (31.0711, 14.1005) construction
  arc A129 (33.4142, 17.4142) -> (30.5858, 14.5858) centre (32, 16) ccw construction
  line L99 (33.8995, 16.9289) -> (33.4142, 17.4142) construction
  arc A130 (55.0711, 14.1005) -> (57.8995, 16.9289) centre (56.4853, 15.5147) ccw construction
  line L100 (54.5858, 14.5858) -> (55.0711, 14.1005) construction
  arc A131 (57.4142, 17.4142) -> (54.5858, 14.5858) centre (56, 16) ccw construction
  line L101 (57.8995, 16.9289) -> (57.4142, 17.4142) construction
  arc A132 (79.0711, 14.1005) -> (81.8995, 16.9289) centre (80.4853, 15.5147) ccw construction
  line L102 (78.5858, 14.5858) -> (79.0711, 14.1005) construction
  arc A133 (81.4142, 17.4142) -> (78.5858, 14.5858) centre (80, 16) ccw construction
  line L103 (81.8995, 16.9289) -> (81.4142, 17.4142) construction
  arc A134 (103.0711, 14.1005) -> (105.8995, 16.9289) centre (104.4853, 15.5147) ccw construction
  line L104 (102.5858, 14.5858) -> (103.0711, 14.1005) construction
  arc A135 (105.4142, 17.4142) -> (102.5858, 14.5858) centre (104, 16) ccw construction
  line L105 (105.8995, 16.9289) -> (105.4142, 17.4142) construction
  arc A136 (127.0711, 14.1005) -> (129.8995, 16.9289) centre (128.4853, 15.5147) ccw construction
  line L106 (126.5858, 14.5858) -> (127.0711, 14.1005) construction
  arc A137 (129.4142, 17.4142) -> (126.5858, 14.5858) centre (128, 16) ccw construction
  line L107 (129.8995, 16.9289) -> (129.4142, 17.4142) construction
  arc A138 (151.0711, 14.1005) -> (153.8995, 16.9289) centre (152.4853, 15.5147) ccw construction
  line L108 (150.5858, 14.5858) -> (151.0711, 14.1005) construction
  arc A139 (153.4142, 17.4142) -> (150.5858, 14.5858) centre (152, 16) ccw construction
  line L109 (153.8995, 16.9289) -> (153.4142, 17.4142) construction
  arc A140 (175.0711, 14.1005) -> (177.8995, 16.9289) centre (176.4853, 15.5147) ccw construction
  line L110 (174.5858, 14.5858) -> (175.0711, 14.1005) construction
  arc A141 (177.4142, 17.4142) -> (174.5858, 14.5858) centre (176, 16) ccw construction
  line L111 (177.8995, 16.9289) -> (177.4142, 17.4142) construction
  circle A142 centre (24, 24) radius 7 construction
  circle A143 centre (48, 24) radius 7 construction
  circle A144 centre (72, 24) radius 7 construction
  circle A145 centre (96, 24) radius 7 construction
  circle A146 centre (120, 24) radius 7 construction
  circle A147 centre (184, 8) radius 2.2
  circle A148 centre (184, 40) radius 2.2
  circle A149 centre (160, 40) radius 2.2
  circle A150 centre (160, 8) radius 2.2
  line L112 (154.25, 44) -> (189.75, 44) projected
  line L113 (154.25, 44) -> (154.25, 0)
  line L114 (189.75, 0) -> (154.25, 0)
  line L115 (154.25, 44) -> (189.75, 44)
  line L116 (189.75, 48) -> (189.75, 44) projected
  line L117 (189.75, 44) -> (189.75, 0)
  point P0 (192, 44)
  dimension "d2" = 4.4
  dimension "d3" = 4.4
  dimension "d4" = 4.4
  dimension "d5" = 4.4
extrude "Extrusion2" add sketch "Sketch2" along normal blind 4
ref_plane "Work Plane3" through (172, 48, 35.9375) normal (1, 0, 0) x (0, 0, -1)
sketch "Sketch3" plane through (172, 48, 35.9375) normal (1, 0, 0) x (0, 0, -1)
  line L0 (31.9375, -48) -> (31.9375, -4) projected
  line L1 (31.9375, -4) -> (0, -4) projected
  line L2 (31.9375, -48) -> (31.9375, -4)
  line L3 (0, -4) -> (31.9375, -48)
  point P0 (35.9375, -48)
extrude "Extrusion3" add sketch "Sketch3" along normal mid plane 12.7
fillet "Fillet1" radius 3.175 4 edges at (178.35, 44, 19.9688) (178.35, 22, 4) (165.65, 22, 4) (165.65, 44, 19.9688)
fillet "Fillet2" radius 3.175 4 edges at (179.2799, 43.0701, 4.9299) (185.6375, 44, 4) (164.7201, 43.0701, 4.9299) (158.3625, 44, 4)
properties part number "crossbar bracket right"
